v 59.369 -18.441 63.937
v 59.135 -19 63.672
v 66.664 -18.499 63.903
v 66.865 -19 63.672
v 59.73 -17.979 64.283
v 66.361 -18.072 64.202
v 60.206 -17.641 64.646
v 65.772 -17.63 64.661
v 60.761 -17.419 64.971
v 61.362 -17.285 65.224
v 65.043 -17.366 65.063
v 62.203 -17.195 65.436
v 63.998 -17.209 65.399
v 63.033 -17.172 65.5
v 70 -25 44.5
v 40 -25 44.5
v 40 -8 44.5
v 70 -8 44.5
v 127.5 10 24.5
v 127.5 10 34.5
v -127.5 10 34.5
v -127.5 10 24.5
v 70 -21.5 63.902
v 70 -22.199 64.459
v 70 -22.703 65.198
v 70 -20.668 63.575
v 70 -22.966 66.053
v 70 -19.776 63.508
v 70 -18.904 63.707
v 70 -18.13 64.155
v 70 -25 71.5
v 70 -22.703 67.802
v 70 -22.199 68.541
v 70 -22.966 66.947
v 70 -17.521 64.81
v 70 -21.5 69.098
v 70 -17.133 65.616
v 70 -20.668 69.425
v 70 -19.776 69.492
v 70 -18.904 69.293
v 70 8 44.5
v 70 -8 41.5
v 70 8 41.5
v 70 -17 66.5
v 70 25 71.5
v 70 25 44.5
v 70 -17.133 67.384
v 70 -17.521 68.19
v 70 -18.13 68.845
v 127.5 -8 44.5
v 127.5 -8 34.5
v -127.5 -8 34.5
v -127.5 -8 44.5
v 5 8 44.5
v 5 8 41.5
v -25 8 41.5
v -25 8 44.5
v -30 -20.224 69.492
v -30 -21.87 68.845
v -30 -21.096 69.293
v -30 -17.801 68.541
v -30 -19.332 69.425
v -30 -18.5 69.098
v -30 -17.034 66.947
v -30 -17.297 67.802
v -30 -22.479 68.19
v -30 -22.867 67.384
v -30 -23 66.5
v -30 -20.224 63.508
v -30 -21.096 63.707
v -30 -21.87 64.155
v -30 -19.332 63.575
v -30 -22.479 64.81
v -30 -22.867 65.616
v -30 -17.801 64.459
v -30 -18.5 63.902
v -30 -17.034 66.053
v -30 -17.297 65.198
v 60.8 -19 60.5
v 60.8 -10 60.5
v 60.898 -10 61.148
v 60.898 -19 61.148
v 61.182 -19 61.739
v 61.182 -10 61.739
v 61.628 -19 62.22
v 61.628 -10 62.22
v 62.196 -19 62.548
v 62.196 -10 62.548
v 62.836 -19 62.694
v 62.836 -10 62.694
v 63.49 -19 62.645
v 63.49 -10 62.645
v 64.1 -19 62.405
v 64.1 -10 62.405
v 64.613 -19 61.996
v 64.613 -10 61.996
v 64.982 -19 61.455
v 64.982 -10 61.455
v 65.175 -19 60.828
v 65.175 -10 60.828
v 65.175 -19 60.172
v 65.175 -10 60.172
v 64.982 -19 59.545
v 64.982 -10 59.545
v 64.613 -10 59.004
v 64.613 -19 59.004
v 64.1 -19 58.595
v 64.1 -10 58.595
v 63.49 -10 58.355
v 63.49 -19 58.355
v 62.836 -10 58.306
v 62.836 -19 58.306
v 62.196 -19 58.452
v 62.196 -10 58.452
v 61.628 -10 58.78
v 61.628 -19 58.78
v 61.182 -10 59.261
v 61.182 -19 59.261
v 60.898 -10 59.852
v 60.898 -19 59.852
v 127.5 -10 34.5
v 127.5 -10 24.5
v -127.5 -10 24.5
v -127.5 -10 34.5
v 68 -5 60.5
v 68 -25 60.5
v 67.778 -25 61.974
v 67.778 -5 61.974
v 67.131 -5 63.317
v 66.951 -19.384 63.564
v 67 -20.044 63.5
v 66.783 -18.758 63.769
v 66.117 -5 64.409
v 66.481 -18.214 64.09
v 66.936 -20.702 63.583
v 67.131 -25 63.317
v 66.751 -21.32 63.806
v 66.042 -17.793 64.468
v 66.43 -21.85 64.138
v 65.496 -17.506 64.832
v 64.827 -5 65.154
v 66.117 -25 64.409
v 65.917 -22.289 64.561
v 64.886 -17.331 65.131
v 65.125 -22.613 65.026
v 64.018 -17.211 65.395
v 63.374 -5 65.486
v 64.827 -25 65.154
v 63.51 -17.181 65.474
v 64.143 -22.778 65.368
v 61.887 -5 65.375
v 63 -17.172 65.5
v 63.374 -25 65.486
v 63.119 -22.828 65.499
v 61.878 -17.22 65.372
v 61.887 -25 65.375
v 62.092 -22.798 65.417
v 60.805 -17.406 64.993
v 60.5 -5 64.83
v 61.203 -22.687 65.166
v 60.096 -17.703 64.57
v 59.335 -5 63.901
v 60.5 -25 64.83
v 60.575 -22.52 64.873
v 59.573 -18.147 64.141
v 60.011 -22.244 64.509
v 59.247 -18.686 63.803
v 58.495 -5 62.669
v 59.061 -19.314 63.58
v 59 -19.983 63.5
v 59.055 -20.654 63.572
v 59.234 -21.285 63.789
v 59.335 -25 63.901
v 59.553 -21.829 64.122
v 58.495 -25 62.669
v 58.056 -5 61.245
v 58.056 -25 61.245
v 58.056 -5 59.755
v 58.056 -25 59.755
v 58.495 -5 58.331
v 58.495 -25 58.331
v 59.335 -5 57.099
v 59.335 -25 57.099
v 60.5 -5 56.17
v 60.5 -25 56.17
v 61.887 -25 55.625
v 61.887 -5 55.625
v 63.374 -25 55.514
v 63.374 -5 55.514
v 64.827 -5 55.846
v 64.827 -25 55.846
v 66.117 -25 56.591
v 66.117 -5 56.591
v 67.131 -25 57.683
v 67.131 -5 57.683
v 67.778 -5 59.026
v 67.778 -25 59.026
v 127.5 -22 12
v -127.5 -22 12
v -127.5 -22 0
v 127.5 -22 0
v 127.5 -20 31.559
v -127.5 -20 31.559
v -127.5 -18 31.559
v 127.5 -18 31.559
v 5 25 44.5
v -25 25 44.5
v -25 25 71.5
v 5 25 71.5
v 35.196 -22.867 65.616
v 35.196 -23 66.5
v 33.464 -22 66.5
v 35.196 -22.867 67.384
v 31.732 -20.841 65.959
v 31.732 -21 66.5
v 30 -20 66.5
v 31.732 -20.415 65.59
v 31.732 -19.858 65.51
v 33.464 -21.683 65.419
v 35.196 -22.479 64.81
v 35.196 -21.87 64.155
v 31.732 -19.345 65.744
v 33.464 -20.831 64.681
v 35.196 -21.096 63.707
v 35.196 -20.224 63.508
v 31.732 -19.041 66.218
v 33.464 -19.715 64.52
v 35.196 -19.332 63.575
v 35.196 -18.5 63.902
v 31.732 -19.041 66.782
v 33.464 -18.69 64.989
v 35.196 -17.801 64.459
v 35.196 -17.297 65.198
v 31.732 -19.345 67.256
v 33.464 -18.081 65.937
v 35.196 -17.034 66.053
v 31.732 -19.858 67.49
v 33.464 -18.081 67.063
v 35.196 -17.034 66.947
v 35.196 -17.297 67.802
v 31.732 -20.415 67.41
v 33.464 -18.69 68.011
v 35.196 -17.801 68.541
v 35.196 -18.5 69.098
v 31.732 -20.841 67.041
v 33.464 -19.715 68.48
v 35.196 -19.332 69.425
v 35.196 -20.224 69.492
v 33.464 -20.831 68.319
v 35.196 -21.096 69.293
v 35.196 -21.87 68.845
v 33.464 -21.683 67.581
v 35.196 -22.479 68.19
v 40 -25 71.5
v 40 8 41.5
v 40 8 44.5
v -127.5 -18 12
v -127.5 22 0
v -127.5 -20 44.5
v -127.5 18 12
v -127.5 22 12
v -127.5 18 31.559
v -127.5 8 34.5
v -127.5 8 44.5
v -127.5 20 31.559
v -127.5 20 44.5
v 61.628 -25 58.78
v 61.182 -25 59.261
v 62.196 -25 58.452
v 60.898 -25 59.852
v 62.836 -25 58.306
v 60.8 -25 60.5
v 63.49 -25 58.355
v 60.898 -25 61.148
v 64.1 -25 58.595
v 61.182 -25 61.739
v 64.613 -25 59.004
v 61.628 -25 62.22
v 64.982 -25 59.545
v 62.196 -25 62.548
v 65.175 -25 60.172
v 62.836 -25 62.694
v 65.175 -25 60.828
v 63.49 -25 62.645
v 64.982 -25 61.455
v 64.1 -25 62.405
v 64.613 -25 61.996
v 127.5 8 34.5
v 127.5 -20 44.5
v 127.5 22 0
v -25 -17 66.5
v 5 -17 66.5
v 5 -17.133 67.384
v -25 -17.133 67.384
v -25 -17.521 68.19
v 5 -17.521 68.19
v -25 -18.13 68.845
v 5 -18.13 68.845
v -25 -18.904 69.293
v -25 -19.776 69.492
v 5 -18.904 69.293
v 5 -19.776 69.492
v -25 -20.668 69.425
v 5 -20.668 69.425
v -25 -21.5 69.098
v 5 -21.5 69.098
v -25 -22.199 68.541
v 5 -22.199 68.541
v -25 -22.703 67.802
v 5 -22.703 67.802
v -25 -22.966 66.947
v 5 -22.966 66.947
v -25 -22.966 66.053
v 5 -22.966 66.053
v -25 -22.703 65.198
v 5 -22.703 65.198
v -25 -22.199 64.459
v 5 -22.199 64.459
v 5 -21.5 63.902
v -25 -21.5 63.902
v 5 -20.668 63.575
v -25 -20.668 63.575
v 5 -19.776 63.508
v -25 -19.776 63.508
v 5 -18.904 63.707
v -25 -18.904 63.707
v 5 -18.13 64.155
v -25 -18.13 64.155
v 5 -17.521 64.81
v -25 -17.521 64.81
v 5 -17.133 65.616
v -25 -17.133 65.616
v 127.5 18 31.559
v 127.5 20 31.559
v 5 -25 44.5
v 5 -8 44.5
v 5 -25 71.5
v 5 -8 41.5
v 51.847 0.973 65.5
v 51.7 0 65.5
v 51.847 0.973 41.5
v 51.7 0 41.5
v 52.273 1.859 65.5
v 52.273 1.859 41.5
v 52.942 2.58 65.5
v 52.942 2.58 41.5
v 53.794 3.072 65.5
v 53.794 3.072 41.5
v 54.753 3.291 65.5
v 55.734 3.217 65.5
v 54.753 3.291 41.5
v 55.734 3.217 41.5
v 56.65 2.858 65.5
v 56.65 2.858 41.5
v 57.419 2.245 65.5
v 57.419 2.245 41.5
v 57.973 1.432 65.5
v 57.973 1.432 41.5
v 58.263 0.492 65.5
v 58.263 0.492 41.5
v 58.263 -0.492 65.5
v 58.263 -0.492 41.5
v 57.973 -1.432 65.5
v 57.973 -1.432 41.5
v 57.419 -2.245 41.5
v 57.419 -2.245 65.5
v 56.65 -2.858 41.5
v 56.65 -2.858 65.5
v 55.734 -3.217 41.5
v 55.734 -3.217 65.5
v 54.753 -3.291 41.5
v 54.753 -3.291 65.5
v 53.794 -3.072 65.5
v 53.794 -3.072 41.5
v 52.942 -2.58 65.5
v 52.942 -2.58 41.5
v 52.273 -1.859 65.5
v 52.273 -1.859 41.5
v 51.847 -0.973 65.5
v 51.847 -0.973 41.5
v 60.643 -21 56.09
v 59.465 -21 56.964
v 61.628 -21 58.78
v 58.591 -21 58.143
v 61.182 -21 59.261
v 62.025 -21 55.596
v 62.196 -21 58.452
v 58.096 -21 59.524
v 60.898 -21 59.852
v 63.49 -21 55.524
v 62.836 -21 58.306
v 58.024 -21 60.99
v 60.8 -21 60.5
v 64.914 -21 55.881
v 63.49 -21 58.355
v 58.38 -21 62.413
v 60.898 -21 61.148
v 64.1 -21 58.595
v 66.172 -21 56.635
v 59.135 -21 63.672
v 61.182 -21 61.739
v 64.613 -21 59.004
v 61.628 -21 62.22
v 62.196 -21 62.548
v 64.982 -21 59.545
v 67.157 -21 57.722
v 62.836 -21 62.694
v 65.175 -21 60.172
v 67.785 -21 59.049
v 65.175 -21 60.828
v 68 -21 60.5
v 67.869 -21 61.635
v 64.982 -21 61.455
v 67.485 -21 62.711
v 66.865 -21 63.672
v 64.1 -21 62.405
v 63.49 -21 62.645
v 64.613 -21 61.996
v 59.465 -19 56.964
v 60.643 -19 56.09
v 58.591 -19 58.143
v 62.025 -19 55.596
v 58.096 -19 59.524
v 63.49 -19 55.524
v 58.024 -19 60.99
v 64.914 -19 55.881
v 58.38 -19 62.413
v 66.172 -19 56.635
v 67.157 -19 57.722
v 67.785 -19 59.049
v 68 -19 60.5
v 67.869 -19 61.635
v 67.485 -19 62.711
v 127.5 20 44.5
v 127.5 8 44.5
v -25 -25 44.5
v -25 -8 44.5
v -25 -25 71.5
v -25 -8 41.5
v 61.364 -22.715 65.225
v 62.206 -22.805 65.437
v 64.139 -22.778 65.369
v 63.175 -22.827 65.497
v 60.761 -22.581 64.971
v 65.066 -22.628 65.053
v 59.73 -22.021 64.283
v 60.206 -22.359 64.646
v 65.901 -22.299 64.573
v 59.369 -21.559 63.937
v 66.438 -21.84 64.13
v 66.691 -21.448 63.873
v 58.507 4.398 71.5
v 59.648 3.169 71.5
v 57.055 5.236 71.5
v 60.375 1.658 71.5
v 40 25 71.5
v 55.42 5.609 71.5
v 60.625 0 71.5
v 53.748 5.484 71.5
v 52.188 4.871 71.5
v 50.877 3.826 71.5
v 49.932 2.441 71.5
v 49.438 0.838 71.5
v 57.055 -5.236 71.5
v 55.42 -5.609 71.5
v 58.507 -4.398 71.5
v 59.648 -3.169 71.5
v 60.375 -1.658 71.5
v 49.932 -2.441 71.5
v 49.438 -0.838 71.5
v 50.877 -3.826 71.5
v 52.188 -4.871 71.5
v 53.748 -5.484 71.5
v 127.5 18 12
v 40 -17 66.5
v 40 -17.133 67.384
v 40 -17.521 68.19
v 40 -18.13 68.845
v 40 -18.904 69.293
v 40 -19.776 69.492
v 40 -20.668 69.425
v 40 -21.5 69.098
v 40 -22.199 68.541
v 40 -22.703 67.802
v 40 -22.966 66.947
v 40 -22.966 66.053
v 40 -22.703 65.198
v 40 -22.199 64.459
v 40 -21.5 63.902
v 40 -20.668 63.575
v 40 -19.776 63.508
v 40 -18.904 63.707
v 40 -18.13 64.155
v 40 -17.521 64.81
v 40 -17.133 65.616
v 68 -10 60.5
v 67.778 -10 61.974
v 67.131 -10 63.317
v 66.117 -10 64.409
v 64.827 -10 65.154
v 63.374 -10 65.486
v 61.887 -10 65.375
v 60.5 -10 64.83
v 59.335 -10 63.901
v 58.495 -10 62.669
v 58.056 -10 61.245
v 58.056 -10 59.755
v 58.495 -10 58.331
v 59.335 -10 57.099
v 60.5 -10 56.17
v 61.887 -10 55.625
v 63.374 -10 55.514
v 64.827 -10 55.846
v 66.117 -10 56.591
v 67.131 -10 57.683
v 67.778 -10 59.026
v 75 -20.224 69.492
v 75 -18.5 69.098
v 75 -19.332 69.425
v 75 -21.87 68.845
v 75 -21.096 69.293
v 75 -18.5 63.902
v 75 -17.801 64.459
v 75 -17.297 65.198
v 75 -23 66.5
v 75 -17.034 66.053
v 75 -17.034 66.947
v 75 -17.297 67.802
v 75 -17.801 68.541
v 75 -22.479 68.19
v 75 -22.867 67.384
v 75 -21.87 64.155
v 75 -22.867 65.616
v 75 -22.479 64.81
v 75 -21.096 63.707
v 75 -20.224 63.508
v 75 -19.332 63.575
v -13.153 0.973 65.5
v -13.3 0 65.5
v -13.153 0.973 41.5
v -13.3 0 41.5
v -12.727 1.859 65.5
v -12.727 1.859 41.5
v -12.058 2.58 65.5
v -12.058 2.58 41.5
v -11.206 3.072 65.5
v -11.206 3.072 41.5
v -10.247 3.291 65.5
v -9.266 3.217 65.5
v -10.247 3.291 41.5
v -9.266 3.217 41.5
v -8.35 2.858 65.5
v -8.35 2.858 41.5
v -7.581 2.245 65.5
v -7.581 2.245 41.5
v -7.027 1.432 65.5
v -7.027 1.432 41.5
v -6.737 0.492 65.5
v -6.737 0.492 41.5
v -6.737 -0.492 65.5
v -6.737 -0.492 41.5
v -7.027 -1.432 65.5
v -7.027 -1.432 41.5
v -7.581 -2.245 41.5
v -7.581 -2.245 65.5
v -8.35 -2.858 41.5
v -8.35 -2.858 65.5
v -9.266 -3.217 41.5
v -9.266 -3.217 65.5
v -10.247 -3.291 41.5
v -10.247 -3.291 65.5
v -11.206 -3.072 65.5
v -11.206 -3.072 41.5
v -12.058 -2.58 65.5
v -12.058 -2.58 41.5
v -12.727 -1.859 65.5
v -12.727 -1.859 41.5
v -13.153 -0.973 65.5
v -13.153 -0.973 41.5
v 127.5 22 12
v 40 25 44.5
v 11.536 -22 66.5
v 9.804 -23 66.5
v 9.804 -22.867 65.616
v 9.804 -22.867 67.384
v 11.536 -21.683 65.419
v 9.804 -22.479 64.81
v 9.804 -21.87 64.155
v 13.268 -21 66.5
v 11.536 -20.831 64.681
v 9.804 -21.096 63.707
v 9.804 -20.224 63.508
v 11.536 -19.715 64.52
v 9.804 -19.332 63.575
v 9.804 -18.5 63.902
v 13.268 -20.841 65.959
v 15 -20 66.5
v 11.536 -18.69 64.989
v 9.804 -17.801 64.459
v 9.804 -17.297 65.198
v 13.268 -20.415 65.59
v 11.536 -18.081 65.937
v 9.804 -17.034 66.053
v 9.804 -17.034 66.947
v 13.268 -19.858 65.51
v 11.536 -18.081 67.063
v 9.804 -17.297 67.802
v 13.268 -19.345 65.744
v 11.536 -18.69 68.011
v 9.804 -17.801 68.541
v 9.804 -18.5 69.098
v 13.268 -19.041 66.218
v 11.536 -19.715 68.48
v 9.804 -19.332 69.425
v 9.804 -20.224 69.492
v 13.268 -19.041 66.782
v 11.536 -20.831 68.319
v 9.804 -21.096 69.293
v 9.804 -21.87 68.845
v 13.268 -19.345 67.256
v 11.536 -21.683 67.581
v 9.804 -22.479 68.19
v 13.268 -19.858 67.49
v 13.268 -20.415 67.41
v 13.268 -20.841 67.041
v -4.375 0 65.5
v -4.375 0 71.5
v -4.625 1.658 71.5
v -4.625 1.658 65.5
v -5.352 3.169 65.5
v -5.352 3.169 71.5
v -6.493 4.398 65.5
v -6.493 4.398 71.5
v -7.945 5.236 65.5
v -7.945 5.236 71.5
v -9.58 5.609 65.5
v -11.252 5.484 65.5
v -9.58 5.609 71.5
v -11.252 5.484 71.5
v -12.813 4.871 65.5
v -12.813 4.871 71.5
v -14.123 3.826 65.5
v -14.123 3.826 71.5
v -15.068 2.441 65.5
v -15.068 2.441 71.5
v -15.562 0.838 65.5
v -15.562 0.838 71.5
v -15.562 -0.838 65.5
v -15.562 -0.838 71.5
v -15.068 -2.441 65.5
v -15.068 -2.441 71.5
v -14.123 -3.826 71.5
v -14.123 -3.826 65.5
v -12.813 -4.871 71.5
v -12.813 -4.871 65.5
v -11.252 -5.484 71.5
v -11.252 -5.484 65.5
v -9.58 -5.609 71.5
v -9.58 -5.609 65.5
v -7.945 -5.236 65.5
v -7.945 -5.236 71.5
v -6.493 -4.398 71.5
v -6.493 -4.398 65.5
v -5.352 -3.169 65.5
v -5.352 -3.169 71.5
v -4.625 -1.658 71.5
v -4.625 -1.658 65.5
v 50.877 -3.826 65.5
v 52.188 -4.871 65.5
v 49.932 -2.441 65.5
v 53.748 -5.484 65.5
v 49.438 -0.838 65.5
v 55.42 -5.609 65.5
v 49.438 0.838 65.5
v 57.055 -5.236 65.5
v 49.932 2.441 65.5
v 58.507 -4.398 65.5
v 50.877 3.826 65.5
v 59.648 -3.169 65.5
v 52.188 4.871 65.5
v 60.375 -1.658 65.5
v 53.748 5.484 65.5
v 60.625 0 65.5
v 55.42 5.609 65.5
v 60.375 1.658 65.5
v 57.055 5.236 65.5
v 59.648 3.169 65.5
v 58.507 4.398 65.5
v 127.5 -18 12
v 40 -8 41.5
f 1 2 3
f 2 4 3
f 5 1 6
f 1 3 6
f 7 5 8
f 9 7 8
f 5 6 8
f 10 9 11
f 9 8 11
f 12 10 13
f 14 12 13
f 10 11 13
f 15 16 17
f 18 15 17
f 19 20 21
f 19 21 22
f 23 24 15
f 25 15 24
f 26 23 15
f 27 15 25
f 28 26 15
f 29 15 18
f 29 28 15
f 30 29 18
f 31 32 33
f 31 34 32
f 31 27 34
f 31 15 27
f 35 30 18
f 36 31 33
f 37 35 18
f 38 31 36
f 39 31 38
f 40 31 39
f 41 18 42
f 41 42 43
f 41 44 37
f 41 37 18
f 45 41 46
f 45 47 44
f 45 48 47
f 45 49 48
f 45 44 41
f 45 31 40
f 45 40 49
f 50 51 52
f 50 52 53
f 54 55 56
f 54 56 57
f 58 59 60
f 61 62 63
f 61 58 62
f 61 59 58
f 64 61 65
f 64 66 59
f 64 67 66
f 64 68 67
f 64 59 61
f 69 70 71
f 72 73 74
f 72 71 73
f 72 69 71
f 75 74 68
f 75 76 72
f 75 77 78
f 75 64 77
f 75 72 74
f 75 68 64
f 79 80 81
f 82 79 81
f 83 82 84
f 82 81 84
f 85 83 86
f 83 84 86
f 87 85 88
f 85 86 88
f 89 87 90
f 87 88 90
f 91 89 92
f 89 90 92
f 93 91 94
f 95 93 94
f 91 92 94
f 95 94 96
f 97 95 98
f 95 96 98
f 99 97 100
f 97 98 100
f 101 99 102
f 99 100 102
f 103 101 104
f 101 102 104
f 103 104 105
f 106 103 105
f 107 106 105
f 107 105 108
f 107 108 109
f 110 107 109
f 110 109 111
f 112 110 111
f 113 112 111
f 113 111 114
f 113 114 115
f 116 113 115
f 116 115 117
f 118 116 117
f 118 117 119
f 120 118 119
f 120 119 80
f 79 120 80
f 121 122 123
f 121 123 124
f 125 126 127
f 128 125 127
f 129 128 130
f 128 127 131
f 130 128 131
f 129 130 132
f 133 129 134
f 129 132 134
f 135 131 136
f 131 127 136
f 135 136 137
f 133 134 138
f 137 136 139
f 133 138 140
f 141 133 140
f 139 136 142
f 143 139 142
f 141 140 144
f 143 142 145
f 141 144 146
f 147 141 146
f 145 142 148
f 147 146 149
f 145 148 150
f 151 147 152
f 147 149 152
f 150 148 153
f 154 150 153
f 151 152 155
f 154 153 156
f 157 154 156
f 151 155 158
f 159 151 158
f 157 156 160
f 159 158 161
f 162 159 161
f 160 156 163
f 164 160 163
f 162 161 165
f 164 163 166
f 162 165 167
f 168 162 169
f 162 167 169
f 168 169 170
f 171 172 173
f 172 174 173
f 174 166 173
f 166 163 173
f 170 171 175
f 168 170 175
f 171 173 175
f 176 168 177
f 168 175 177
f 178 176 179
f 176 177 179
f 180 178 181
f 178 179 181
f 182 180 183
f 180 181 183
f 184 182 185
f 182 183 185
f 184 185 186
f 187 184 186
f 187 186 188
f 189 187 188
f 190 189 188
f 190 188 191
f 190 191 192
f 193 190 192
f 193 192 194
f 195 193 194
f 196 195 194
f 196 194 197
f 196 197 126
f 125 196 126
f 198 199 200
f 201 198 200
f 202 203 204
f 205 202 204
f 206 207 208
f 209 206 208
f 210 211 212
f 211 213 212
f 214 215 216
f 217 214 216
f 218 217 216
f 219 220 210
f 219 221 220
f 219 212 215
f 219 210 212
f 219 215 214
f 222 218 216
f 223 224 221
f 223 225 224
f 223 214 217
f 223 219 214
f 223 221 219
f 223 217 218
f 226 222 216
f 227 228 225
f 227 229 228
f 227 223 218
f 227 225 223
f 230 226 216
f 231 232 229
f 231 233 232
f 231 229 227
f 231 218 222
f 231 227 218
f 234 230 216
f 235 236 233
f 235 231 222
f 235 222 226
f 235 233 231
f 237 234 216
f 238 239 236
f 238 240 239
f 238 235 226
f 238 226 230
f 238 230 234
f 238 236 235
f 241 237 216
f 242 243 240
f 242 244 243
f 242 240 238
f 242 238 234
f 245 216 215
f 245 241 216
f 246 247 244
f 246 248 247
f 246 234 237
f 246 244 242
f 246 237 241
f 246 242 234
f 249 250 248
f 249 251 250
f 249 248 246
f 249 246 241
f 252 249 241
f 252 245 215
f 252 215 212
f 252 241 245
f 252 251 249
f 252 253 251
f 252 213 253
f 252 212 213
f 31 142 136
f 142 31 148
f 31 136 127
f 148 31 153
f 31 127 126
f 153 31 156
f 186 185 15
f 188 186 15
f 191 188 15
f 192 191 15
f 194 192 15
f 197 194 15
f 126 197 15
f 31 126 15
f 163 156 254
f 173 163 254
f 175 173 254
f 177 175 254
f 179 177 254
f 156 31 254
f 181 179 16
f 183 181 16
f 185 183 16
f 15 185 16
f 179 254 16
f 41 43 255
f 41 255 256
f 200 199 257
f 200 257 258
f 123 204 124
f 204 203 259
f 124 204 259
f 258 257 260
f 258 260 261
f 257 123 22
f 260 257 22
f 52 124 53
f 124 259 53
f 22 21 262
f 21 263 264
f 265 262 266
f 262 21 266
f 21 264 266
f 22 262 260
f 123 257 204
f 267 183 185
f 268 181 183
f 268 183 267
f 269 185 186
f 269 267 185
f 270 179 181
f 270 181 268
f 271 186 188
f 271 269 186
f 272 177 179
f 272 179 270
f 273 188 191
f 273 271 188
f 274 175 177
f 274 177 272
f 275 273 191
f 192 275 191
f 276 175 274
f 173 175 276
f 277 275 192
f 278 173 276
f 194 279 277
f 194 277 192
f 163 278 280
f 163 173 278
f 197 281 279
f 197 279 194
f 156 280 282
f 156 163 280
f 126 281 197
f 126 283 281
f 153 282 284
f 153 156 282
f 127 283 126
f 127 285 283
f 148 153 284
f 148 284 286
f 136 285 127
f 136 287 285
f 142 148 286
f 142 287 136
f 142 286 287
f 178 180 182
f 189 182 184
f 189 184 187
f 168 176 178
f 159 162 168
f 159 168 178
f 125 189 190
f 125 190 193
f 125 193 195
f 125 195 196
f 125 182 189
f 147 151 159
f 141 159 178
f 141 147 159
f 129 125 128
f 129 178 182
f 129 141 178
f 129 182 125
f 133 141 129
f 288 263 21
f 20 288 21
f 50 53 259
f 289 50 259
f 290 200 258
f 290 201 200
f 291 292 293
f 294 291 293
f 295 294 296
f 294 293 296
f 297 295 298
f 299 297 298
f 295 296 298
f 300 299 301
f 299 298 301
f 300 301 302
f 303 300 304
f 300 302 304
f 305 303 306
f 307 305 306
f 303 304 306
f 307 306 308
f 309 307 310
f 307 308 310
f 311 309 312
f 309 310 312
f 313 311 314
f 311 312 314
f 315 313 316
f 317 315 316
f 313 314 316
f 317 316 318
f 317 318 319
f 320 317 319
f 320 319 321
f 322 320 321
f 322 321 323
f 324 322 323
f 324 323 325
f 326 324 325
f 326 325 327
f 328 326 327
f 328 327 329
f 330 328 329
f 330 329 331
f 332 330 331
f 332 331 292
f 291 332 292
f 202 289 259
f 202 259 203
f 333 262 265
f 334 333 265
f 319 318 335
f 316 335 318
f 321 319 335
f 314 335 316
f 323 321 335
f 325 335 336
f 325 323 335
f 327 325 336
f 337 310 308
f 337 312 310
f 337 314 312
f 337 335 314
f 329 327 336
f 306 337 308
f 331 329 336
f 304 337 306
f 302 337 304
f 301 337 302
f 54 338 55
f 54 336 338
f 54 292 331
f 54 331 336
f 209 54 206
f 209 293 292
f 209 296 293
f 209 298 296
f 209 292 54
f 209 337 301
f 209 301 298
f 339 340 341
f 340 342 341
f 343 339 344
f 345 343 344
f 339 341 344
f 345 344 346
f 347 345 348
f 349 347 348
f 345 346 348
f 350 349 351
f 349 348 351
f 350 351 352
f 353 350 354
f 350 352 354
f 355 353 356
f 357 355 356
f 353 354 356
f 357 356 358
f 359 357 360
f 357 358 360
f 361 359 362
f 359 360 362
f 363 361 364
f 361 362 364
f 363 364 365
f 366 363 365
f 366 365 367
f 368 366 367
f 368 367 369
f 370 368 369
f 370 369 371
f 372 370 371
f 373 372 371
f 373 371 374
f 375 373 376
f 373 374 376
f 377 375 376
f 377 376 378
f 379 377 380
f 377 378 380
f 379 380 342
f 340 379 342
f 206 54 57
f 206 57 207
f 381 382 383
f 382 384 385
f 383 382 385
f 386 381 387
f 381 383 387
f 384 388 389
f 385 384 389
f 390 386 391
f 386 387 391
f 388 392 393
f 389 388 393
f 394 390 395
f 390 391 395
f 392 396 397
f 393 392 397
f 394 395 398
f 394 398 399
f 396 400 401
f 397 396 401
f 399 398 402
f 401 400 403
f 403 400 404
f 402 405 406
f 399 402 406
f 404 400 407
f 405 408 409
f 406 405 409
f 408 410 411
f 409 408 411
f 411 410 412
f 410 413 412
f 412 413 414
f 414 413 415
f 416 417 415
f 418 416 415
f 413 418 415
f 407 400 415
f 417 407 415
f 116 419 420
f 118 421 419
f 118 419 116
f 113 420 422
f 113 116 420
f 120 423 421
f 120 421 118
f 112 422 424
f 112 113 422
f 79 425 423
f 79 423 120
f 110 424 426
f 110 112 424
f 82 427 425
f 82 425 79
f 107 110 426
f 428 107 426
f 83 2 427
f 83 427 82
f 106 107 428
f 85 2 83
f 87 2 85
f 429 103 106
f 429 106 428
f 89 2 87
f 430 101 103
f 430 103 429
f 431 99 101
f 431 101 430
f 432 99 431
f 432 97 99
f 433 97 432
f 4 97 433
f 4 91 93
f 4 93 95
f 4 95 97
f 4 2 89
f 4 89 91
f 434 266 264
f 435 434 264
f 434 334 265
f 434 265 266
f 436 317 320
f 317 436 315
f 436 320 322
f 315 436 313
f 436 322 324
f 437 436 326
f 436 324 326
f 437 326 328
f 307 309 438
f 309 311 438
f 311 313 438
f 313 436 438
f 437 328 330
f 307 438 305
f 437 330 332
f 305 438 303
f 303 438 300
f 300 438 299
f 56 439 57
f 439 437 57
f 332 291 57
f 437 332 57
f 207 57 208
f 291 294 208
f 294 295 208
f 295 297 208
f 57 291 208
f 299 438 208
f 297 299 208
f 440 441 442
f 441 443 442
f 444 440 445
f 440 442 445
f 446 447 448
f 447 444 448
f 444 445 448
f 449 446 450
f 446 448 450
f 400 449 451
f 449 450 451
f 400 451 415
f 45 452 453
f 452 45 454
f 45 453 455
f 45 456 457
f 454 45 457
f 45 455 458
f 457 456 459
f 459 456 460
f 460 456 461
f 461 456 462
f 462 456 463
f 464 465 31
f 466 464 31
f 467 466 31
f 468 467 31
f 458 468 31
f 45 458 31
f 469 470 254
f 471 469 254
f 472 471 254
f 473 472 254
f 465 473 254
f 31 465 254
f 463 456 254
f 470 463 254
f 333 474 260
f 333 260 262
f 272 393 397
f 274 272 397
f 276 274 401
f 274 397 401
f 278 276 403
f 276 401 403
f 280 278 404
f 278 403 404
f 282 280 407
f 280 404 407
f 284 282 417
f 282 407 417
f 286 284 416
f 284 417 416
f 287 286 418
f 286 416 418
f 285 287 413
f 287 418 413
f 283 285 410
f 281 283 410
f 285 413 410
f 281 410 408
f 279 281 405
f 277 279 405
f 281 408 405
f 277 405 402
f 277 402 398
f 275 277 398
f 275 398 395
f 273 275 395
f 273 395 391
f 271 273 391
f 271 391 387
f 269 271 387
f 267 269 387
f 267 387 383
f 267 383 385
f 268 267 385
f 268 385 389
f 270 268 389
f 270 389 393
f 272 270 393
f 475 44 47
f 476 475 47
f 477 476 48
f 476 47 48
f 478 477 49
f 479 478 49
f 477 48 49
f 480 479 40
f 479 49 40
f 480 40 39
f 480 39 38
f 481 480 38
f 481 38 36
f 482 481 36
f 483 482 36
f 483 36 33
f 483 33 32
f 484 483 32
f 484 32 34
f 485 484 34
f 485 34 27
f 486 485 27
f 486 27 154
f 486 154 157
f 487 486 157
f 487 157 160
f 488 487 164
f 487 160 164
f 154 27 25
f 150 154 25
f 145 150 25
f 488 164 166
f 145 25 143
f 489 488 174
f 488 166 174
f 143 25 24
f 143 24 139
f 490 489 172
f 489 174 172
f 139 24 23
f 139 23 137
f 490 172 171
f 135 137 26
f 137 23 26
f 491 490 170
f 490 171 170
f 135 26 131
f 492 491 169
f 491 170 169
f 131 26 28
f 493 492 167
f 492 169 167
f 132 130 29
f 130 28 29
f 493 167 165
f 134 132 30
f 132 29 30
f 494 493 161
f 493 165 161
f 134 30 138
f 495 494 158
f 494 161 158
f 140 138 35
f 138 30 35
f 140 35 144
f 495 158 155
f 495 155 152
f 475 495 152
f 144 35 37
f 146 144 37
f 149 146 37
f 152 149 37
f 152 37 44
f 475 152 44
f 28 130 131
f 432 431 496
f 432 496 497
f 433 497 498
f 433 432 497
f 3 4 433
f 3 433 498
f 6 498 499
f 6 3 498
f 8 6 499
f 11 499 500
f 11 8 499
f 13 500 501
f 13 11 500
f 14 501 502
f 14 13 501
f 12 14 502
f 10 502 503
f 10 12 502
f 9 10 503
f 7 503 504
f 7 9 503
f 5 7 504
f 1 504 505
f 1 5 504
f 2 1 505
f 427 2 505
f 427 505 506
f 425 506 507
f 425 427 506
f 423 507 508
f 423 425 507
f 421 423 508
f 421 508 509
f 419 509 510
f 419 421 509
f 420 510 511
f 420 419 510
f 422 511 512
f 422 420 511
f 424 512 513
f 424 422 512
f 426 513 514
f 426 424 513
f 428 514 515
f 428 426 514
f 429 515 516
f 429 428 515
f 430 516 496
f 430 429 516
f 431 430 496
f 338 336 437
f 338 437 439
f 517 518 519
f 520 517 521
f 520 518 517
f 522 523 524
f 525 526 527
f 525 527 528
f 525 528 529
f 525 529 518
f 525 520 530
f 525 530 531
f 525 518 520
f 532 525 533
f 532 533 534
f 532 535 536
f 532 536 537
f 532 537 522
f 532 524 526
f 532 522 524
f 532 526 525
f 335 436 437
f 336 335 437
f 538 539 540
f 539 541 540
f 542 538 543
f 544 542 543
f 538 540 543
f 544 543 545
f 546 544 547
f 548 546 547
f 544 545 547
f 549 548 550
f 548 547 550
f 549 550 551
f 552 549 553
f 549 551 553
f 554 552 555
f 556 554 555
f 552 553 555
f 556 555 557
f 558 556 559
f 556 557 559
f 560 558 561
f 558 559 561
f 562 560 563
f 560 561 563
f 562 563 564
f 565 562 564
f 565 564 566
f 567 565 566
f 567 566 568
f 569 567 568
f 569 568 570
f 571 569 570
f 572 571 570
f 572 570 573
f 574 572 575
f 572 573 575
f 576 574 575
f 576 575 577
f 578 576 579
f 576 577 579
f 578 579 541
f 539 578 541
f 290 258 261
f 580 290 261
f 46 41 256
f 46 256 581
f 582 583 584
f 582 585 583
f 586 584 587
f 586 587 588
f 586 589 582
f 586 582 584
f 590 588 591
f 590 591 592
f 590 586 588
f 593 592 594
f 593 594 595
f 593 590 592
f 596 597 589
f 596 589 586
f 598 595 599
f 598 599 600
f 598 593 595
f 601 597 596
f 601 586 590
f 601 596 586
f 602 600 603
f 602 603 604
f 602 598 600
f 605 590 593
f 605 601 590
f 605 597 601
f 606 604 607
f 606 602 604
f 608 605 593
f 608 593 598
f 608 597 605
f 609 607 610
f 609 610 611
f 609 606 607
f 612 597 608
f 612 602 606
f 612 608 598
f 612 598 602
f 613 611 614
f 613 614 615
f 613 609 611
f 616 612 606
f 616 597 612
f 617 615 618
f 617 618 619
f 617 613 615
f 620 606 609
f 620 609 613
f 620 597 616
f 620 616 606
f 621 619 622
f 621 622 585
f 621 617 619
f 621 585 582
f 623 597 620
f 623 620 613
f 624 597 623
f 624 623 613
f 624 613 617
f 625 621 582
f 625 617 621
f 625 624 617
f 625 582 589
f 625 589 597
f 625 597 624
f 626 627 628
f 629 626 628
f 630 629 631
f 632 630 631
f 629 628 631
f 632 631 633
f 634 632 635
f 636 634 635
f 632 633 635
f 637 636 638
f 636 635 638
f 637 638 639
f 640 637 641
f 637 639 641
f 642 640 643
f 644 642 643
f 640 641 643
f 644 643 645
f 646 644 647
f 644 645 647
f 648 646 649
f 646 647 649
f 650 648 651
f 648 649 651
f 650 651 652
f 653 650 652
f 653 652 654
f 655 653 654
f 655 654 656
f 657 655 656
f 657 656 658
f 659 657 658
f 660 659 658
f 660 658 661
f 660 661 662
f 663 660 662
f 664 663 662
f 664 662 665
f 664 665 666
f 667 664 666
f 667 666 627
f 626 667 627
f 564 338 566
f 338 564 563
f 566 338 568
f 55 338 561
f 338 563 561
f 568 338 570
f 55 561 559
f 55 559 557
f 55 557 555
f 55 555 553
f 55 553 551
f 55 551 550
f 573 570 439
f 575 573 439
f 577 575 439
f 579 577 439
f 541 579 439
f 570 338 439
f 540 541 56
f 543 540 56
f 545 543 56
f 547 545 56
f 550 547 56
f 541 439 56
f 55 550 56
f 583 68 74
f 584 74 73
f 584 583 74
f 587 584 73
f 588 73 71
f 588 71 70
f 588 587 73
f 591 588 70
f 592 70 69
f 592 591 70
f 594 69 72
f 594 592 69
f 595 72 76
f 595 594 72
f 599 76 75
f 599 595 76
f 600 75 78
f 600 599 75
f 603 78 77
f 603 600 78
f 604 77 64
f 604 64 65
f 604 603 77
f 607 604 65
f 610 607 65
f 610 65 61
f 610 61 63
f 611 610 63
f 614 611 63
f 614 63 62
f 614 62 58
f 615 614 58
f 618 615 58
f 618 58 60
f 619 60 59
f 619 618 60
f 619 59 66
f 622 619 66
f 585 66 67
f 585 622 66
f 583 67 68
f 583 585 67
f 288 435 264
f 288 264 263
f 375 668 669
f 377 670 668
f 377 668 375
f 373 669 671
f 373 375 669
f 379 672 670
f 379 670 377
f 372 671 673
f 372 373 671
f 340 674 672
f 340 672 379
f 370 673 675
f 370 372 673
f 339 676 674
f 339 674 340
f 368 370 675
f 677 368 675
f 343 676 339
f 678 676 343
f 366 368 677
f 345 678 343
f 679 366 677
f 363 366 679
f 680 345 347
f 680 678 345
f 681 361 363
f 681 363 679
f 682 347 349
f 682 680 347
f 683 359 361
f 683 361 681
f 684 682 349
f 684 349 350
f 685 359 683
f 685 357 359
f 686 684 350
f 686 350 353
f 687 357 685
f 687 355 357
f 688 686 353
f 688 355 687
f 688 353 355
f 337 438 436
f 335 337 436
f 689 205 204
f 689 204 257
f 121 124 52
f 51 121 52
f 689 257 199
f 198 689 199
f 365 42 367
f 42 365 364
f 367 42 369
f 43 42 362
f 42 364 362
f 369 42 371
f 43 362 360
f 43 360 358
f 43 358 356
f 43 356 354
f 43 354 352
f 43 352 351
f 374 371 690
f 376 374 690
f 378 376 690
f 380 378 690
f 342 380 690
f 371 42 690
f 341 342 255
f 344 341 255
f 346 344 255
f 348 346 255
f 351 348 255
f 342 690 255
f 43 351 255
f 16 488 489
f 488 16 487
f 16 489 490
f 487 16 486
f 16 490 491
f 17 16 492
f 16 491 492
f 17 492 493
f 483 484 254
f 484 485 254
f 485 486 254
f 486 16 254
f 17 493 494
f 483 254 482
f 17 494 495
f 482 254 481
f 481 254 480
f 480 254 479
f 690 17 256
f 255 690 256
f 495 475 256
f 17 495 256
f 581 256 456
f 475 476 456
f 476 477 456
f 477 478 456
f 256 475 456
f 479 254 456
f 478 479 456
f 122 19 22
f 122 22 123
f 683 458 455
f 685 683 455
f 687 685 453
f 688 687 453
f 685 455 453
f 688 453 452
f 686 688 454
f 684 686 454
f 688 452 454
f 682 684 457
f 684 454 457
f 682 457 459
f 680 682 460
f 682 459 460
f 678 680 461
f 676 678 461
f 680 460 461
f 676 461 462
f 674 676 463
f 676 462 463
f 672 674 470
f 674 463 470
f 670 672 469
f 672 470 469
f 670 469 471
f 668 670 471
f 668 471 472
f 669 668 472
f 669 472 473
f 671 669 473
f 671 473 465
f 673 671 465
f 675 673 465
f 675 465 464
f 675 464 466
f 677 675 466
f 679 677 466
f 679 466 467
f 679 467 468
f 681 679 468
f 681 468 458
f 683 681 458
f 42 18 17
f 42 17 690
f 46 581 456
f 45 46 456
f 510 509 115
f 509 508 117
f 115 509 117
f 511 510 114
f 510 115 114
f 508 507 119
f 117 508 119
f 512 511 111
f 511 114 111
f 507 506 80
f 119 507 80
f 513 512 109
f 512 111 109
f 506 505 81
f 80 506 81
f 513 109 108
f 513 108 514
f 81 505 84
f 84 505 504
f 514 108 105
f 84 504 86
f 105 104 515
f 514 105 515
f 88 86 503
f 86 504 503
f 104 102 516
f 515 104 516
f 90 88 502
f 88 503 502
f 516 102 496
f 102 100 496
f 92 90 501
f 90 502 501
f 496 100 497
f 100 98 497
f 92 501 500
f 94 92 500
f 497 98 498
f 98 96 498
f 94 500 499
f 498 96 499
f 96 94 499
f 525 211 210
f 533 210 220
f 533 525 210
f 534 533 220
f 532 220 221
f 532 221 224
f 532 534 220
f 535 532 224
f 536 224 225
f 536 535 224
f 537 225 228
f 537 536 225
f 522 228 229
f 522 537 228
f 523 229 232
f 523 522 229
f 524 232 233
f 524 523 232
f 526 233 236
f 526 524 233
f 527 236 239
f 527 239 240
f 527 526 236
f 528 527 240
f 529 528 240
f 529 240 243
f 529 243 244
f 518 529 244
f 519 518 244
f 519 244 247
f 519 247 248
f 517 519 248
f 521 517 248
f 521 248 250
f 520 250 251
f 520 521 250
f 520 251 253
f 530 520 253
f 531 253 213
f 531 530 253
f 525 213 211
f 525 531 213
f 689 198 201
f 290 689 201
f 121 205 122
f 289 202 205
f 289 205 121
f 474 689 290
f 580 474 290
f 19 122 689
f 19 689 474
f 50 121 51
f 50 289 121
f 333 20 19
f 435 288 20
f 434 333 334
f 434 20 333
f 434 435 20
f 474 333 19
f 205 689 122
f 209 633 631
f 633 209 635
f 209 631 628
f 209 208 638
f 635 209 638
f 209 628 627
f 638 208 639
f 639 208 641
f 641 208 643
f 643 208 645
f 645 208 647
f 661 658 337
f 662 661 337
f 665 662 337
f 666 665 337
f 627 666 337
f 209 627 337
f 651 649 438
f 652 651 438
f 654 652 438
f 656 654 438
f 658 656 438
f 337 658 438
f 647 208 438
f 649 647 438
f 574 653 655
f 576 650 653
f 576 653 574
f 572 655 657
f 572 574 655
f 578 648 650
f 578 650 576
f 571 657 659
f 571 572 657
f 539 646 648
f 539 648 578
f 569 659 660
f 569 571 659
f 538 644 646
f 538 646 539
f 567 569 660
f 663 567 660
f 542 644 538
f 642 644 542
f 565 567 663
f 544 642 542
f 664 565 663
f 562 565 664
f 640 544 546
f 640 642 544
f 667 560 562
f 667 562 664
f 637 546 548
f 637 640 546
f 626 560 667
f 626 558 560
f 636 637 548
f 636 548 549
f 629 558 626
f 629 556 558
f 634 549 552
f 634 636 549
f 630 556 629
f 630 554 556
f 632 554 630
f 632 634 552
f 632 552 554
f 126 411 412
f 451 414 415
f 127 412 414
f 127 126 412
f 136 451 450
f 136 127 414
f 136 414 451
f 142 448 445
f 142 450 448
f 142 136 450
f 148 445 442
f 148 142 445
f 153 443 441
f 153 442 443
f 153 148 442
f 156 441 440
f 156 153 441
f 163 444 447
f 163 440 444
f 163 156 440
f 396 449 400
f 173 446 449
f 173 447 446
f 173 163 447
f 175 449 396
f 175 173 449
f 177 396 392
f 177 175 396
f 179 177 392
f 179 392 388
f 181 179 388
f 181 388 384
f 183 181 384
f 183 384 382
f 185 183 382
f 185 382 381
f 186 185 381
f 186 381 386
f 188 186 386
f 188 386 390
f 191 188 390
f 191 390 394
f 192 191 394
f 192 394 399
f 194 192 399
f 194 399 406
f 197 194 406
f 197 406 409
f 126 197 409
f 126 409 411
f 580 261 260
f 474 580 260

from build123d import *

# Parameters (mm, degrees)
F1_DEPTH        = 127.5
F5_DEPTH        = 30
F7_DEPTH        = 30
F8_R            = 3
F9_DEPTH        = 197.501
F10_R           = 3
F11_DEPTH       = 132.501
F14_D           = 6.6
F14_CBORE_D     = 11.25
F14_CBORE_DEPTH = 6
F15_D           = 6.6
F15_CBORE_D     = 11.25
F15_CBORE_DEPTH = 6
F20_R           = 5
F20_R_2         = 2
F21_DEPTH       = 20
F22_DEPTH       = 15
F23_D           = 4.4
F24_DEPTH       = 202.501
F25_W           = 10
F25_H           = 2
F26_DEPTH       = 66.501


with BuildPart() as f1:
    # F0 (on Right) → F1 (new body, symmetric)
    with BuildSketch(Plane.YZ):
        Polygon((-22, 0), (0, 0), (0, 24.5), (-10, 24.5), (-10, 34.5), (-8, 34.5), (-8, 41.5), (-8, 44.5), (-20, 44.5), (-20, 31.5588298937), (-18, 31.5588298937), (-18, 12), (-22, 12), align=None)
        Polygon((0, 24.5), (0, 0), (22, 0), (22, 12), (18, 12), (18, 31.5588298937), (20, 31.5588298937), (20, 44.5), (8, 44.5), (8, 41.5), (8, 34.5), (10, 34.5), (10, 24.5), align=None)
    extrude(amount=F1_DEPTH, both=True)

    # F10 (on face) → F11 (cut, through all)
    with BuildSketch(Plane.YZ.offset(5)):
        with Locations((-20, 66.5)):
            Circle(F10_R)
    extrude(amount=-F11_DEPTH, mode=Mode.SUBTRACT)


with BuildPart() as f5:
    # F4 (on offset) → F5 (new body)
    with BuildSketch(Plane.YZ.offset(40)):
        Polygon((-25, 71.5), (-25, 44.5), (-8, 44.5), (-8, 41.5), (8, 41.5), (8, 44.5), (25, 44.5), (25, 71.5), align=None)
    extrude(amount=F5_DEPTH)


with BuildPart() as f7:
    # F6 (on offset) → F7 (new body)
    with BuildSketch(Plane.YZ.offset(-25)):
        Polygon((-8, 41.5), (8, 41.5), (8, 44.5), (20, 44.5), (25, 44.5), (25, 71.5), (-25, 71.5), (-25, 44.5), (-20, 44.5), (-8, 44.5), align=None)
    extrude(amount=F7_DEPTH)


with BuildPart() as f9_tool:
    # F8 (on face) → F9 (new body, through all)
    with BuildSketch(Plane.YZ.offset(70)):
        with Locations((-20, 66.5)):
            Circle(F8_R)
    extrude(amount=-F9_DEPTH)


with BuildPart() as f5_1:
    add(f5.part)

    # F9: cut by f9_tool
    add(f9_tool.part, mode=Mode.SUBTRACT)

    # F15 (through all)
    with Locations(Plane.XY.offset(71.5)):
        with Locations((55, 0)):
            CounterBoreHole(F15_D / 2, F15_CBORE_D / 2, F15_CBORE_DEPTH)

    # F20 (on face) → F21 (cut)
    with BuildSketch(Plane.XZ.offset(25)):
        with Locations((63, 60.5)):
            Circle(F20_R)
        with Locations((63, 60.5)):
            Circle(F20_R_2, mode=Mode.SUBTRACT)
        with Locations((63, 60.5)):
            Circle(F20_R_2)
    extrude(amount=-F21_DEPTH, mode=Mode.SUBTRACT)


with BuildPart() as f7_1:
    add(f7.part)

    # F9: cut by f9_tool
    add(f9_tool.part, mode=Mode.SUBTRACT)

    # F14 (through all)
    with Locations(Plane.XY.offset(71.5)):
        with Locations((-10, 0)):
            CounterBoreHole(F14_D / 2, F14_CBORE_D / 2, F14_CBORE_DEPTH)


with BuildPart() as f18:
    # F17 (on offset) → F18 (revolve)
    with BuildSketch(Plane.XY.offset(66.5)):
        Polygon((75, -20), (30, -20), (35.1961524227, -23), (75, -23), align=None)
    revolve(axis=Axis((28.5532526373, -20, 66.5), (1, 0, 0)))


with BuildPart() as f19:
    # F17 (on offset) → F19 (revolve)
    with BuildSketch(Plane.XY.offset(66.5)):
        Polygon((15, -20), (-30, -20), (-30, -23), (9.8038475773, -23), align=None)
    revolve(axis=Axis((-7.5, -20, 66.5), (1, 0, 0)))


with BuildPart() as f22:
    # F20 (on face) → F22 (new body)
    with BuildSketch(Plane.XZ.offset(25)):
        with Locations((63, 60.5)):
            Circle(F20_R)
        with Locations((63, 60.5)):
            Circle(F20_R_2, mode=Mode.SUBTRACT)
        with Locations((63, 60.5)):
            Circle(F20_R_2)
    extrude(amount=-F22_DEPTH)

    # F23 (through all)
    with Locations(Plane.XZ.offset(25)):
        with Locations((63, 60.5)):
            Hole(F23_D / 2)

    # F24 (cut, through all): a face of the model
    f24_faces = [f18.part.faces().sort_by_distance(p)[0] for p in [
        (75, -20, 66.5),
    ]]
    extrude(f24_faces, amount=-F24_DEPTH, mode=Mode.SUBTRACT)

    # F25 (on offset) → F26 (cut, through all)
    with BuildSketch(Plane.XY.offset(66.5)):
        with Locations((63, -20)):
            Rectangle(F25_W, F25_H)
    extrude(amount=-F26_DEPTH, mode=Mode.SUBTRACT)


solid = Compound([f1.part, f5_1.part, f7_1.part, f18.part, f19.part, f22.part])
